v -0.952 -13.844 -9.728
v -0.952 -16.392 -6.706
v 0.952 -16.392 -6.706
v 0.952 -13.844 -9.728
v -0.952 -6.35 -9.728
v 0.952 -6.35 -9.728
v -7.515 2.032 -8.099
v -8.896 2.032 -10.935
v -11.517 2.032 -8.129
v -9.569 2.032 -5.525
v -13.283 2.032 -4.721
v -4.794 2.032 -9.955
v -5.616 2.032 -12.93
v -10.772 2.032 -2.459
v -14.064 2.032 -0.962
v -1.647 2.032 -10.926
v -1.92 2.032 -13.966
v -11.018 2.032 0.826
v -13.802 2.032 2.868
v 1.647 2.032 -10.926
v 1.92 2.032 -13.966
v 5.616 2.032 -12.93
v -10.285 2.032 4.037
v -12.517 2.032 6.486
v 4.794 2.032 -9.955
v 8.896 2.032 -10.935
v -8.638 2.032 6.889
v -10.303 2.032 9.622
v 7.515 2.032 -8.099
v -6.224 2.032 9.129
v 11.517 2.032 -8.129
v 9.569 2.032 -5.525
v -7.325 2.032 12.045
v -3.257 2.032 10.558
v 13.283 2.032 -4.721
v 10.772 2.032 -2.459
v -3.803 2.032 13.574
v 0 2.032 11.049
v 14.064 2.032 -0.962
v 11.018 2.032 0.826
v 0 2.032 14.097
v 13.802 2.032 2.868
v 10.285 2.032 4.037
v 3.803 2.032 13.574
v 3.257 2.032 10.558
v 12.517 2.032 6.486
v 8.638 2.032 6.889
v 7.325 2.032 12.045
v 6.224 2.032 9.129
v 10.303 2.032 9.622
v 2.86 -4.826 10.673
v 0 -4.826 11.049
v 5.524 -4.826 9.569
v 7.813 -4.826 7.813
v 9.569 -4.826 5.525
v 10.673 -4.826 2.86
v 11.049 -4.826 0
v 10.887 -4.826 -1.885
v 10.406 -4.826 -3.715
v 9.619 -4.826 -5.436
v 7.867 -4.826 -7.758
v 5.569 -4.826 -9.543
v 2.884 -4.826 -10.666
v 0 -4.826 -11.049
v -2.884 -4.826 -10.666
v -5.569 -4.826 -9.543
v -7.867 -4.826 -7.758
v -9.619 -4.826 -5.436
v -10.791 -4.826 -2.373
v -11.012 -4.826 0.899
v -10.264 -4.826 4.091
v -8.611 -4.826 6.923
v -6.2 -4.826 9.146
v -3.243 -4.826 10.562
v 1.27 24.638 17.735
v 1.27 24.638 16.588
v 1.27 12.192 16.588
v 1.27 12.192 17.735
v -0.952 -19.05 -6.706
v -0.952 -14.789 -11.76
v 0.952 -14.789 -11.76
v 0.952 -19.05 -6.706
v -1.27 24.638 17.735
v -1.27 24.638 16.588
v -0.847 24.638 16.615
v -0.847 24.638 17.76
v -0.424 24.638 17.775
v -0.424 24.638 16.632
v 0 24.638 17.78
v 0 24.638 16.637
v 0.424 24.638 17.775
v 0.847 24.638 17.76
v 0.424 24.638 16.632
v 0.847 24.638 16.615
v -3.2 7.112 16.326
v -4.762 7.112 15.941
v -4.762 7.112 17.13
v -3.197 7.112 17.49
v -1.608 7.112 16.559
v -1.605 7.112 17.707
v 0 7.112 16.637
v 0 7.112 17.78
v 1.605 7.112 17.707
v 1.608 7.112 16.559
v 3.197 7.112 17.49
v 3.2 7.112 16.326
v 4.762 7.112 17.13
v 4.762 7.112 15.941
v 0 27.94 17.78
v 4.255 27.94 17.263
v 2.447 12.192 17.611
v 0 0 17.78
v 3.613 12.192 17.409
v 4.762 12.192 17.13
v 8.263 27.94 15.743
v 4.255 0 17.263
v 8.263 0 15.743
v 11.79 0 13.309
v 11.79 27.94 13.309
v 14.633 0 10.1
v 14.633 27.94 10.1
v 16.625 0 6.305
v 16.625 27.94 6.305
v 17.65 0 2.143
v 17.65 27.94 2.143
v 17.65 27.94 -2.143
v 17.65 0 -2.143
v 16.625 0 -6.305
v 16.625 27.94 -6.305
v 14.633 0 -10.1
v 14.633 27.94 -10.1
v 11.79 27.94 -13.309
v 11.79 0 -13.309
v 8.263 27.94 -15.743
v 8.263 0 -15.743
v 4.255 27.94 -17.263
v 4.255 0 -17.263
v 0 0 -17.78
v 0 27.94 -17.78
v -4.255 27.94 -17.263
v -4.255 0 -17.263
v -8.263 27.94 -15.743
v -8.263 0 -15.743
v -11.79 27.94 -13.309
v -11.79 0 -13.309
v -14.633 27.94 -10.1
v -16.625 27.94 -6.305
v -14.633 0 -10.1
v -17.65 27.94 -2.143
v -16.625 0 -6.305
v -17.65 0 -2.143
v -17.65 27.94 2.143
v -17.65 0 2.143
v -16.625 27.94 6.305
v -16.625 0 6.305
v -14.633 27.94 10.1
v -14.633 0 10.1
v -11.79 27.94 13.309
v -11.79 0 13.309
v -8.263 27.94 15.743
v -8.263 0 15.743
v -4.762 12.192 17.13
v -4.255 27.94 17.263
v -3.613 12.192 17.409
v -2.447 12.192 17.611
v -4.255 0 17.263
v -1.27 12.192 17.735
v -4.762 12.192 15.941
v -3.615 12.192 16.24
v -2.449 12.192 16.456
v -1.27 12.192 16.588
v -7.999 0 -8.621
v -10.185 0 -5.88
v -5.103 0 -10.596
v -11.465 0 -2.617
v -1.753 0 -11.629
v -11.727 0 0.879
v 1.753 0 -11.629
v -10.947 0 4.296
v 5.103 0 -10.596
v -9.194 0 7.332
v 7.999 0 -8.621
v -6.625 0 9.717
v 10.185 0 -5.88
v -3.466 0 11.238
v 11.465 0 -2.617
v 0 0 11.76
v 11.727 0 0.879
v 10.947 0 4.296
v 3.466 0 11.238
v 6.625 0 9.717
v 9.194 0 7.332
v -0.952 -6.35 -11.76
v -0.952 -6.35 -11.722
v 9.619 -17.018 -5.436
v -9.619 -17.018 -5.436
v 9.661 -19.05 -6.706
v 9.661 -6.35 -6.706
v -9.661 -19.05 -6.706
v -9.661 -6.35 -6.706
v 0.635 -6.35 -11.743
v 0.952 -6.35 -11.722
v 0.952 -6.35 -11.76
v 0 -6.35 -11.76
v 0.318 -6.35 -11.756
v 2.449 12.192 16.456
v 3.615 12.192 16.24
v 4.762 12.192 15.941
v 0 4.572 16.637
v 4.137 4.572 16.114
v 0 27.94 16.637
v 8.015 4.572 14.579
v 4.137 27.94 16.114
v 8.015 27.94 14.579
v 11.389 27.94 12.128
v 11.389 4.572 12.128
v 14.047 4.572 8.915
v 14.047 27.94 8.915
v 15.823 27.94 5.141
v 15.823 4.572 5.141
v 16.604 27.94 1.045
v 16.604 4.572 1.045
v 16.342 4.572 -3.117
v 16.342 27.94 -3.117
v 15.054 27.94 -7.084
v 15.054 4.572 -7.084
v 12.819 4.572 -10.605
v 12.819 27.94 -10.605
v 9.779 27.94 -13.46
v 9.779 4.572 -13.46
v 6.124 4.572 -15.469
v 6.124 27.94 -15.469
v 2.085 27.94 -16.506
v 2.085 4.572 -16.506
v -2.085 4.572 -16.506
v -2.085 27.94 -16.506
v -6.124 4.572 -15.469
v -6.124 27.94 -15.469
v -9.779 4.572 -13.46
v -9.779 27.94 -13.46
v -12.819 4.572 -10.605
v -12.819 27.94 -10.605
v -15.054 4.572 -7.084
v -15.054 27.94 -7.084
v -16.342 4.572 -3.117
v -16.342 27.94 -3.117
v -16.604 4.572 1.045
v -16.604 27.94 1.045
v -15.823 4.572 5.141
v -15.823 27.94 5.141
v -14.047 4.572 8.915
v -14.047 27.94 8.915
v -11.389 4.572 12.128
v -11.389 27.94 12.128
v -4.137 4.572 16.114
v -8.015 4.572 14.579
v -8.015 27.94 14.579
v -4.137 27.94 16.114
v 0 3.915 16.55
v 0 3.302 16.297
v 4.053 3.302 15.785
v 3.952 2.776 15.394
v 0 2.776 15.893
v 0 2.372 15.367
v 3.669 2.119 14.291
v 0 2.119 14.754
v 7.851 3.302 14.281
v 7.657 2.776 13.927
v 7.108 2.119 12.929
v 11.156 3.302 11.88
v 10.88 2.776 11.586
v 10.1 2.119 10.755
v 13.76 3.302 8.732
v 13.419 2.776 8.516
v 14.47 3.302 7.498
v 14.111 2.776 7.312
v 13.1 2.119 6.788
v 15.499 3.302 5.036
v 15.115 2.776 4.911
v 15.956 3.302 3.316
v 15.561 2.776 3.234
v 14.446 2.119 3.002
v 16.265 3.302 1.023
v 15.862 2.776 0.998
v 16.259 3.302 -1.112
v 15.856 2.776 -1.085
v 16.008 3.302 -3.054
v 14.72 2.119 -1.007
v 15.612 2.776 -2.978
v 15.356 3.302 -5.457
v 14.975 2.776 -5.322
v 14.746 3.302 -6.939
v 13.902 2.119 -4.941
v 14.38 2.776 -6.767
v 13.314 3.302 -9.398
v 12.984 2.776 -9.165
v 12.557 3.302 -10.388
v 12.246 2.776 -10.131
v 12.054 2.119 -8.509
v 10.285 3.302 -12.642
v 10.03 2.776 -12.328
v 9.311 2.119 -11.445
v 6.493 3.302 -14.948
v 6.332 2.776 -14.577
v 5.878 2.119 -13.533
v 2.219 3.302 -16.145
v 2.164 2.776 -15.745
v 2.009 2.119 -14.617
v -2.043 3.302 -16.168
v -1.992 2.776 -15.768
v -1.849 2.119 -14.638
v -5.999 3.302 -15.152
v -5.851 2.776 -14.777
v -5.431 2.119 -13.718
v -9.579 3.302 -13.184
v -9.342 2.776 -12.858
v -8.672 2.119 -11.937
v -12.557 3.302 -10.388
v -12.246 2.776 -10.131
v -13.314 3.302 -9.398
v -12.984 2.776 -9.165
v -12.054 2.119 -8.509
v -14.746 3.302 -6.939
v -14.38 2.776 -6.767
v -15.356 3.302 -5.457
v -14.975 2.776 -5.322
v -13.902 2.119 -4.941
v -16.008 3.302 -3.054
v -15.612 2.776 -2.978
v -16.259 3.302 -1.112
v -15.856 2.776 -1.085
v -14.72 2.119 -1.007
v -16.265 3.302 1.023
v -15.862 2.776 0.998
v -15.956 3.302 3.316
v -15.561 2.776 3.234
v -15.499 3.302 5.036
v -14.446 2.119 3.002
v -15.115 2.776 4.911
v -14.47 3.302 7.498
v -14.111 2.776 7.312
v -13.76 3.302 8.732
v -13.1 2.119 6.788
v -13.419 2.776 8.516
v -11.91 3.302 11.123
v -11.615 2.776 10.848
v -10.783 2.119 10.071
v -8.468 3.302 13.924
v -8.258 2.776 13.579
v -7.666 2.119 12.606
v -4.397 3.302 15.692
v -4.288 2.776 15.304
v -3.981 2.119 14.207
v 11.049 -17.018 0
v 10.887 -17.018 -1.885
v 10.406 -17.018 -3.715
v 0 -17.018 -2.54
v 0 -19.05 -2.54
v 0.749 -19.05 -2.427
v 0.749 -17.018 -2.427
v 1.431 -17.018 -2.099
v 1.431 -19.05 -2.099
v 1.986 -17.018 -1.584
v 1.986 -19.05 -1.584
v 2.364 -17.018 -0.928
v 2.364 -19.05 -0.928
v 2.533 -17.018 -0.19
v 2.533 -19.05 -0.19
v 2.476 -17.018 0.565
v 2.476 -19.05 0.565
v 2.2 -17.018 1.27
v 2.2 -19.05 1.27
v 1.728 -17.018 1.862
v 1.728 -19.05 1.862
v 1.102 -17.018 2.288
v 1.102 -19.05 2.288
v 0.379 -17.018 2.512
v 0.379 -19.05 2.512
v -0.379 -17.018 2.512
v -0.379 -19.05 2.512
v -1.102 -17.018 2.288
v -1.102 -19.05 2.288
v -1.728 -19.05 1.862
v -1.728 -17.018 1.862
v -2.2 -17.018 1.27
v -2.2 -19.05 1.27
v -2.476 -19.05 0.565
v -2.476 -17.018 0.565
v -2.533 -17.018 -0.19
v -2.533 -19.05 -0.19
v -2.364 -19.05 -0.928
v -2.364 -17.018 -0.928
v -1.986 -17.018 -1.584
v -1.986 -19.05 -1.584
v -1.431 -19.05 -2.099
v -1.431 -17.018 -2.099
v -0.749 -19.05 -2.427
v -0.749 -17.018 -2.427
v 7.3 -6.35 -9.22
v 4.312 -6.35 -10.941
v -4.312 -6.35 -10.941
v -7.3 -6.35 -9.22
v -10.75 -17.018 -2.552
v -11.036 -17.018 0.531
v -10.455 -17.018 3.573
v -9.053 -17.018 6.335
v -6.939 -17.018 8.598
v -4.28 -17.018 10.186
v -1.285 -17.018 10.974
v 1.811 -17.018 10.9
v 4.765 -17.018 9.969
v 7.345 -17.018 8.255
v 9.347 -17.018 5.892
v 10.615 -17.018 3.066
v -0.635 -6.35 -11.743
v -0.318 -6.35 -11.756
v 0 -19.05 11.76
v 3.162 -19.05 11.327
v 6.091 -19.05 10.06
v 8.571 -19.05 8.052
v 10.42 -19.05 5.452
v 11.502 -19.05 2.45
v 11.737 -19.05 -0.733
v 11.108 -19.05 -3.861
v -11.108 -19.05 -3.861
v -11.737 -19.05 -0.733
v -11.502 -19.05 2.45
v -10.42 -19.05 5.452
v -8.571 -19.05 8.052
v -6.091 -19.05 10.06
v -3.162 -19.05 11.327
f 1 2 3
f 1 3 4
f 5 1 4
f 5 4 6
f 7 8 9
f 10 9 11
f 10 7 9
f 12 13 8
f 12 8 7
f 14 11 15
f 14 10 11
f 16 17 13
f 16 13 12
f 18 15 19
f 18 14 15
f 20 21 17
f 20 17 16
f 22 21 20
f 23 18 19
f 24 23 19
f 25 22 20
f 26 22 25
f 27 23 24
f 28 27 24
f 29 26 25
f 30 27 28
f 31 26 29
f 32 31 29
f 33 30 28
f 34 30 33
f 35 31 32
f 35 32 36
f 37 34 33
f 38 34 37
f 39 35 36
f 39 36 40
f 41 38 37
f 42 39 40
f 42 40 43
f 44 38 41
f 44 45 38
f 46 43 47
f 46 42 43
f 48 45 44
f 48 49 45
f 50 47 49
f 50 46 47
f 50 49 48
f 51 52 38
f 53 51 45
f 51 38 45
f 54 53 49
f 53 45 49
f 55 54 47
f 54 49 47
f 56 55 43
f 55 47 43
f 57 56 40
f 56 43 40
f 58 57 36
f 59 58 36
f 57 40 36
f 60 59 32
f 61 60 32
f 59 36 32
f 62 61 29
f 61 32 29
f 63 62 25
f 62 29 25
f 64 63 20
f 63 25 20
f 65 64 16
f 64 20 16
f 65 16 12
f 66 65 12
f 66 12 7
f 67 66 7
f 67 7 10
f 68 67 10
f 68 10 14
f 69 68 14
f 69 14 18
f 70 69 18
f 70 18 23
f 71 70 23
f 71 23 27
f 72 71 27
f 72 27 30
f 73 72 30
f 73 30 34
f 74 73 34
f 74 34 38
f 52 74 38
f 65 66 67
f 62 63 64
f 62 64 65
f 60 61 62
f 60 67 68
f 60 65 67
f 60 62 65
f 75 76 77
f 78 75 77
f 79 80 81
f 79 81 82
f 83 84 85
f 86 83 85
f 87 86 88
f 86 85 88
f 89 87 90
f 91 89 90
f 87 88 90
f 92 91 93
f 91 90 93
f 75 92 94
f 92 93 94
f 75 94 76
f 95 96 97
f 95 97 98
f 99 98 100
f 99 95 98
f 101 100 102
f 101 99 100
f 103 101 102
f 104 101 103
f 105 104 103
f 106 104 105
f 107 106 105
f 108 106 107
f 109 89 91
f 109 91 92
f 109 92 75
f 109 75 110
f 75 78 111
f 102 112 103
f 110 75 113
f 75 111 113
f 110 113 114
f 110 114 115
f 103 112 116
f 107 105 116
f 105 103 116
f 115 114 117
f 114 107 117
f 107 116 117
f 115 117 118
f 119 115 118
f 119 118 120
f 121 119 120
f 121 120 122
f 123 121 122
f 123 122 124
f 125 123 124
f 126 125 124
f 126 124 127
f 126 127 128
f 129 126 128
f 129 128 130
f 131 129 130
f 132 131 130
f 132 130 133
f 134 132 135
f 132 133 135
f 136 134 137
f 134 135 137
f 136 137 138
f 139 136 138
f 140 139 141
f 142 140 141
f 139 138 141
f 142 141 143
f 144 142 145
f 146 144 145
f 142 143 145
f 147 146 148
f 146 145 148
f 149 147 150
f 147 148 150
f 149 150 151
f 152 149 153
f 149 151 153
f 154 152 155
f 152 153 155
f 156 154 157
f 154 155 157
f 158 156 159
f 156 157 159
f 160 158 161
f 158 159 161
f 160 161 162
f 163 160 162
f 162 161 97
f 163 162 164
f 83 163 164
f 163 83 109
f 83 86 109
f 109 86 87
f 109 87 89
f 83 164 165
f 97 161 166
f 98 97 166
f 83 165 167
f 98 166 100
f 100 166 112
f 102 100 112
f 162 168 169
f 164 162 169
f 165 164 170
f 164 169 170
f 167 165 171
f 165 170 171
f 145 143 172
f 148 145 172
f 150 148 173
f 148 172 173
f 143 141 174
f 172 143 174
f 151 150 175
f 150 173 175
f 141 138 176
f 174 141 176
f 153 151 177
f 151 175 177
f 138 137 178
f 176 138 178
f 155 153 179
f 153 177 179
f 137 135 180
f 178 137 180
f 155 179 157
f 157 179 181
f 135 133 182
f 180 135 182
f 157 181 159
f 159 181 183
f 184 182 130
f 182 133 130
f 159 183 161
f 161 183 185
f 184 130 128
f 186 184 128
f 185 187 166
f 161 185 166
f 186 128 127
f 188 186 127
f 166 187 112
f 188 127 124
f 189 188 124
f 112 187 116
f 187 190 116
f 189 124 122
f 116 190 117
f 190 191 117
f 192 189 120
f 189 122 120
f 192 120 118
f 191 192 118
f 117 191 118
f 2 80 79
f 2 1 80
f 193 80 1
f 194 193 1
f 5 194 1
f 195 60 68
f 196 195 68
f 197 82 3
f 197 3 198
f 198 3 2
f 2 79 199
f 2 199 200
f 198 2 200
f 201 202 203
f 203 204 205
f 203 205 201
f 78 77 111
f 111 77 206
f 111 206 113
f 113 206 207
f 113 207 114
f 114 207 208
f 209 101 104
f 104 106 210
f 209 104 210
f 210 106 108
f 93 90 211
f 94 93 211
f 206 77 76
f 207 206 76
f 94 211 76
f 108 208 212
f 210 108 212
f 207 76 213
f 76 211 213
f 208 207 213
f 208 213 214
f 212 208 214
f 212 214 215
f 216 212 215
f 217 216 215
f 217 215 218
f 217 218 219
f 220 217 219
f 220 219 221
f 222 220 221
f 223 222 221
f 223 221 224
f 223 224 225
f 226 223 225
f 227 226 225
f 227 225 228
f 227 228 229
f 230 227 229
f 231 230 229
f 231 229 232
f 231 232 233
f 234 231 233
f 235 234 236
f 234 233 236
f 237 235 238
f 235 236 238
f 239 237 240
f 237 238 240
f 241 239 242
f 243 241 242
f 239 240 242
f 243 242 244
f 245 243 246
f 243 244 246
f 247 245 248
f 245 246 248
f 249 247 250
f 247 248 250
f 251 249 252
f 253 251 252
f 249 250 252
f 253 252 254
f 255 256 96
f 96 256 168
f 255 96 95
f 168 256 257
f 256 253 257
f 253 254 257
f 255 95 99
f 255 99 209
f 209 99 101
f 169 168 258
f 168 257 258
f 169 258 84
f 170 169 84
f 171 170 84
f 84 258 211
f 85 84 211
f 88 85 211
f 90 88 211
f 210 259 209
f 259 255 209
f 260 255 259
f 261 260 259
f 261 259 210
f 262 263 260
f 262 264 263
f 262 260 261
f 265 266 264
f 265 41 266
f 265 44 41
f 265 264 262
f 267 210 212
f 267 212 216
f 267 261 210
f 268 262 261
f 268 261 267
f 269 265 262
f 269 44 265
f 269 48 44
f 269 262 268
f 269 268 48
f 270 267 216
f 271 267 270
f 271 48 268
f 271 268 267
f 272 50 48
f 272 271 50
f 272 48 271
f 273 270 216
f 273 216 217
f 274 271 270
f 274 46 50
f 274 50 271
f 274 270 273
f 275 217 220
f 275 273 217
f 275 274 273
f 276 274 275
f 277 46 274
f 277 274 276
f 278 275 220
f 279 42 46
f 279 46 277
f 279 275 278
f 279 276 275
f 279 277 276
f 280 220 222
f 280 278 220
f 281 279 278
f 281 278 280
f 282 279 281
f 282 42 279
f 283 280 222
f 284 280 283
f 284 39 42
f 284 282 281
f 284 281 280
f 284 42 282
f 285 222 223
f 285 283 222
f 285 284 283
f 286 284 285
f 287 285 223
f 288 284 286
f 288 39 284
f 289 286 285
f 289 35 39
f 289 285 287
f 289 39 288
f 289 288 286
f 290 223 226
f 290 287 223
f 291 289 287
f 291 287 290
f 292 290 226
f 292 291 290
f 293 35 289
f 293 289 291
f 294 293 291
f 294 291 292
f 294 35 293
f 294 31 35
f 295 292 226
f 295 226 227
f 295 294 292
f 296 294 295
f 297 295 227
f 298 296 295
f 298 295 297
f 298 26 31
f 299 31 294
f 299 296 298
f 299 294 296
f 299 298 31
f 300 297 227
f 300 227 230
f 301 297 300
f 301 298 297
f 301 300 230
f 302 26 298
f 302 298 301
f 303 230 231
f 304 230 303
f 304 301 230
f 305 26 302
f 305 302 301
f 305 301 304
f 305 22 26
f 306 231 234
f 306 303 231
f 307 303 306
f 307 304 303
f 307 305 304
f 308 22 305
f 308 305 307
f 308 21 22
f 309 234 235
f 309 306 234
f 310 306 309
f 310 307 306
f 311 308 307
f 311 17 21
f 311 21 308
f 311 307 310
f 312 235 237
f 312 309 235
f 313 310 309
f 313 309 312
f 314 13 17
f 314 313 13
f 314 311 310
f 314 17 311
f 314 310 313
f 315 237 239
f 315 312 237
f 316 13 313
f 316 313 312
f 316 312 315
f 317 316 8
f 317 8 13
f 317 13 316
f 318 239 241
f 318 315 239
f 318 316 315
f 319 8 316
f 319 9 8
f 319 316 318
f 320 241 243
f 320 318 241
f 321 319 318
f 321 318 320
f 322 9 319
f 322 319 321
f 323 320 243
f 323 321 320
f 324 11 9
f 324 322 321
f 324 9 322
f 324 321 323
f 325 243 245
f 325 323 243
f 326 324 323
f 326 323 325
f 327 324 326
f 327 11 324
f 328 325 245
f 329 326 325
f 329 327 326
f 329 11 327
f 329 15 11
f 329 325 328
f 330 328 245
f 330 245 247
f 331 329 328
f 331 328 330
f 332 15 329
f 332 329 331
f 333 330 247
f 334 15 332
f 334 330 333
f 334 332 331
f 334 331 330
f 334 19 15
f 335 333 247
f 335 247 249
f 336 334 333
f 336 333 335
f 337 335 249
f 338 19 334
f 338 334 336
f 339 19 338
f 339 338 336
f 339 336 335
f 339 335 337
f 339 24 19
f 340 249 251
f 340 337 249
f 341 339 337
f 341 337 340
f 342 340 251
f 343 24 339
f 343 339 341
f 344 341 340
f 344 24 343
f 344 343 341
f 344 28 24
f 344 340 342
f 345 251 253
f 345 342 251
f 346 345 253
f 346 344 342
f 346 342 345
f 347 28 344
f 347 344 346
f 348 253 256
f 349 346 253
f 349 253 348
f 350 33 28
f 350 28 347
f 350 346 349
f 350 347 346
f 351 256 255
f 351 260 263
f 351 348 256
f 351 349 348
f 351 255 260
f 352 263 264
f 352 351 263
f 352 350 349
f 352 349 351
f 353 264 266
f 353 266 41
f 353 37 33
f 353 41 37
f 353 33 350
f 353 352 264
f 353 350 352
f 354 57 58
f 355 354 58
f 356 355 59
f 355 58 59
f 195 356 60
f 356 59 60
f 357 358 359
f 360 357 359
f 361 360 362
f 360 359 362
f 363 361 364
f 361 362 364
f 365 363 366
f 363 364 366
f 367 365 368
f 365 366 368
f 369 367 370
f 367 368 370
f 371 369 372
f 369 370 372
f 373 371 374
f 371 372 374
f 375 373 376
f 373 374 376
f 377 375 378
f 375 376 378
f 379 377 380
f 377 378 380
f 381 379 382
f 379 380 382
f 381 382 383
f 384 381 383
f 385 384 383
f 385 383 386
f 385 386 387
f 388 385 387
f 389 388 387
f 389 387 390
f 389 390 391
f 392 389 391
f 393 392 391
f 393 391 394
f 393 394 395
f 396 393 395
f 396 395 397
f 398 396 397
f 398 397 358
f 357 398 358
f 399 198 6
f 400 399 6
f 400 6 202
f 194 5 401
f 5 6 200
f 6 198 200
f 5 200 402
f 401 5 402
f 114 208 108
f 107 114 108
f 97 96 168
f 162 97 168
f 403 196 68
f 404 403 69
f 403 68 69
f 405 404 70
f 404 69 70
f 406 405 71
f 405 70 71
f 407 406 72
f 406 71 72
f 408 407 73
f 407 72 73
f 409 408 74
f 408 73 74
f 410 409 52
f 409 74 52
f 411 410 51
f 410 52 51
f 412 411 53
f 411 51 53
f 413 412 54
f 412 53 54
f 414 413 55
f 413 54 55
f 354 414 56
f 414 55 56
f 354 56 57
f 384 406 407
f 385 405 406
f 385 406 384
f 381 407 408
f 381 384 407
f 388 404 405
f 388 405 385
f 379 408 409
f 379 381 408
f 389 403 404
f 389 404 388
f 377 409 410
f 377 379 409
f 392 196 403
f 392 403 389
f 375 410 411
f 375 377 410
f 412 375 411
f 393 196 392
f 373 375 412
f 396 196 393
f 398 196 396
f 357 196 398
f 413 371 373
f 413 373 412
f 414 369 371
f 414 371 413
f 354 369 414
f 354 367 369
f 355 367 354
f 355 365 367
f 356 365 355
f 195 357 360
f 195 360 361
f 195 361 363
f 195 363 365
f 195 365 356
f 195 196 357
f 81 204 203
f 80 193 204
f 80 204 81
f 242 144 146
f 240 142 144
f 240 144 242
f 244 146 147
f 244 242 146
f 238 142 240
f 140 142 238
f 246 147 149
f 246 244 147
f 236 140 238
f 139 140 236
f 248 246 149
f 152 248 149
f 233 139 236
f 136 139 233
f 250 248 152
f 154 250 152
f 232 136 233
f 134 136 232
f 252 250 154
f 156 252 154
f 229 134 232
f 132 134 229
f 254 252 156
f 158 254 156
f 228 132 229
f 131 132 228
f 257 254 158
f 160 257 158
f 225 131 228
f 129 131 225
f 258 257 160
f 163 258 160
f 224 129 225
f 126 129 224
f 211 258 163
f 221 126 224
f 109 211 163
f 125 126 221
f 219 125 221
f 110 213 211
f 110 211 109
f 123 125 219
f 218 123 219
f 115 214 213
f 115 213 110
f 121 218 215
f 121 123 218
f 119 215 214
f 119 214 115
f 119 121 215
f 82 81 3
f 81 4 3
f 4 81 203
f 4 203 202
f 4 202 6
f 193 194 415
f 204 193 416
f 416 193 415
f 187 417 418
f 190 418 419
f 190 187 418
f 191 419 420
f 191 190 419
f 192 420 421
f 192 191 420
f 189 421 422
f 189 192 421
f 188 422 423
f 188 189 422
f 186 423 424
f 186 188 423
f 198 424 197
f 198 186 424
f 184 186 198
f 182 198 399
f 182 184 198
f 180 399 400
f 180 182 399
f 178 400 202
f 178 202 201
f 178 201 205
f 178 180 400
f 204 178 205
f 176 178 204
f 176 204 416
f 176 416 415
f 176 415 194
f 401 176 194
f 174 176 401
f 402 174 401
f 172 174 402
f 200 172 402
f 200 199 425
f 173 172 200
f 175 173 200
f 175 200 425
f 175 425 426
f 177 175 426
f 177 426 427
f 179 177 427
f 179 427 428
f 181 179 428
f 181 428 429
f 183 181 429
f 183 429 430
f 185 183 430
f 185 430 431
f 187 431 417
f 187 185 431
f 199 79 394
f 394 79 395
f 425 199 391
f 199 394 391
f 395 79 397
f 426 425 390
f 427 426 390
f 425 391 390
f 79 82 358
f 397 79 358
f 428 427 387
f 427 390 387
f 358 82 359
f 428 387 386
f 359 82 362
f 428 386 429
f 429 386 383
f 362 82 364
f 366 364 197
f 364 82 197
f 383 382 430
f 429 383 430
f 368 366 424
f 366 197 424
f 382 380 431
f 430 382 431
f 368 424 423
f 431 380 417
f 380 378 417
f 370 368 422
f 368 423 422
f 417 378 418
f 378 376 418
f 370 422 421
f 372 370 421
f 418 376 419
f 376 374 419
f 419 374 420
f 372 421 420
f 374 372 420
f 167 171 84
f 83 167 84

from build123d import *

# Parameters (mm, degrees)
SKETCH1_R                = 17.78
BOSS_EXTRUDE1_DEPTH      = 27.94
SKETCH2_R                = 11.7602
BOSS_EXTRUDE2_DEPTH      = 19.05
SKETCH3_R                = 16.637
CUT_EXTRUDE1_DEPTH       = 25.908
SKETCH4_R                = 11.049
CUT_EXTRUDE2_DEPTH       = 6.858
CUT_EXTRUDE3_DEPTH       = 38.588567411
CUT_EXTRUDE3_DEPTH_BACK  = 38.588567411
SKETCH5_W                = 5.0546
SKETCH5_H                = 12.7
BOSS_EXTRUDE3_DEPTH      = 0.9525
BOSS_EXTRUDE3_DEPTH_BACK = 0.9525
CUT_EXTRUDE4_DEPTH       = 12.192
FILLET1_R                = 2.54
CUT_EXTRUDE5_DEPTH       = 38.588567411
CUT_EXTRUDE6_REACH       = 55.295
SKETCH12_R               = 2.54


with BuildPart() as part:
    # Sketch1 → Boss-Extrude1 (new body)
    with BuildSketch(Plane(origin=(0, 0, 0), x_dir=(1, 0, 0), z_dir=(0, 1, 0))):
        with Locations(Location((0, 0, 0), (0, 0, 270))):
            Circle(SKETCH1_R)
    extrude(amount=BOSS_EXTRUDE1_DEPTH)

    # Sketch2 → Boss-Extrude2 (add)
    with BuildSketch(Plane(origin=(0, 0, 0), x_dir=(1, 0, 0), z_dir=(0, 1, 0))):
        with Locations(Location((0, 0, 0), (0, 0, 270))):
            Circle(SKETCH2_R)
    extrude(amount=-BOSS_EXTRUDE2_DEPTH)

    # Sketch3 → Cut-Extrude1 (cut)
    with BuildSketch(Plane(origin=(0, 27.94, 0), x_dir=(1, 0, 0), z_dir=(0, 1, 0))):
        with Locations(Location((0, 0, 0), (0, 0, 270))):
            Circle(SKETCH3_R)
    extrude(amount=-CUT_EXTRUDE1_DEPTH, mode=Mode.SUBTRACT)

    # Sketch4 → Cut-Extrude2 (cut)
    with BuildSketch(Plane(origin=(0, 2.032, 0), x_dir=(1, 0, 0), z_dir=(0, 1, 0))):
        with Locations(Location((0, 0, 0), (0, 0, 270))):
            Circle(SKETCH4_R)
    extrude(amount=-CUT_EXTRUDE2_DEPTH, mode=Mode.SUBTRACT)

    # Sketch5 → Cut-Extrude3 (cut, two sides: drawn at the far end of the back side and taken through both)
    with BuildSketch(Plane(origin=(0, 0, 0), x_dir=(0, 0, -1), z_dir=(1, 0, 0)).offset(-CUT_EXTRUDE3_DEPTH_BACK)):
        with Locations((9.2329, -12.7)):
            Rectangle(SKETCH5_W, SKETCH5_H)
    extrude(amount=CUT_EXTRUDE3_DEPTH + CUT_EXTRUDE3_DEPTH_BACK, mode=Mode.SUBTRACT)

    # Sketch7 → Boss-Extrude3 (add, two sides: drawn at the far end of the back side and taken through both)
    with BuildSketch(Plane(origin=(0, 0, 0), x_dir=(0, 0, -1), z_dir=(1, 0, 0)).offset(-BOSS_EXTRUDE3_DEPTH_BACK)):
        Polygon((11.7602, -6.35), (11.7602, -14.788545455), (6.7056, -19.05), (6.7056, -16.392200431), (9.7282, -13.843893442), (9.7282, -6.35), align=None)
    extrude(amount=BOSS_EXTRUDE3_DEPTH + BOSS_EXTRUDE3_DEPTH_BACK)

    # Sketch9 → Cut-Extrude4 (cut)
    with BuildSketch(Plane(origin=(0, -4.826, 0), x_dir=(1, 0, 0), z_dir=(0, 1, 0))):
        with BuildLine():
            Line((9.619493419, 5.4356), (-9.619493419, 5.4356))
            ThreePointArc((-9.619493419, 5.4356), (-2.810215135, -10.685648876), (11.049, 0))
            ThreePointArc((11.049, 0), (10.685648876, 2.810215135), (9.619493419, 5.4356))
        make_face()
    extrude(amount=-CUT_EXTRUDE4_DEPTH, mode=Mode.SUBTRACT)

    # Fillet1
    fillet1_edges = [part.edges().sort_by_distance(p)[0] for p in [
        (0, 2.032, -16.637),
    ]]
    fillet(fillet1_edges, radius=FILLET1_R)

    # Sketch11 → Cut-Extrude5 (cut, through all)
    with BuildSketch(Plane.XY):
        Polygon((-2.532708507, 7.112), (-4.7625, 7.112), (-4.7625, 12.192), (-1.27, 12.192), (-1.27, 24.638), (1.27, 24.638), (1.27, 12.192), (4.7625, 12.192), (4.7625, 7.112), (2.532708507, 7.112), align=None)
    extrude(amount=CUT_EXTRUDE5_DEPTH, mode=Mode.SUBTRACT)

    # Sketch12 → Cut-Extrude6 (cut, up to next)
    with BuildSketch(Plane.XZ.offset(19.05), mode=Mode.PRIVATE) as cut_extrude6_sk1:
        with Locations(Location((0, 0, 0), (0, 0, 270))):
            Circle(SKETCH12_R)
    cut_extrude6_tool1 = extrude(cut_extrude6_sk1.sketch, amount=-CUT_EXTRUDE6_REACH, mode=Mode.PRIVATE) & part.part
    add(cut_extrude6_tool1.solids().sort_by_distance((0, -19.05, 0))[0], mode=Mode.SUBTRACT)


solid = part.part
